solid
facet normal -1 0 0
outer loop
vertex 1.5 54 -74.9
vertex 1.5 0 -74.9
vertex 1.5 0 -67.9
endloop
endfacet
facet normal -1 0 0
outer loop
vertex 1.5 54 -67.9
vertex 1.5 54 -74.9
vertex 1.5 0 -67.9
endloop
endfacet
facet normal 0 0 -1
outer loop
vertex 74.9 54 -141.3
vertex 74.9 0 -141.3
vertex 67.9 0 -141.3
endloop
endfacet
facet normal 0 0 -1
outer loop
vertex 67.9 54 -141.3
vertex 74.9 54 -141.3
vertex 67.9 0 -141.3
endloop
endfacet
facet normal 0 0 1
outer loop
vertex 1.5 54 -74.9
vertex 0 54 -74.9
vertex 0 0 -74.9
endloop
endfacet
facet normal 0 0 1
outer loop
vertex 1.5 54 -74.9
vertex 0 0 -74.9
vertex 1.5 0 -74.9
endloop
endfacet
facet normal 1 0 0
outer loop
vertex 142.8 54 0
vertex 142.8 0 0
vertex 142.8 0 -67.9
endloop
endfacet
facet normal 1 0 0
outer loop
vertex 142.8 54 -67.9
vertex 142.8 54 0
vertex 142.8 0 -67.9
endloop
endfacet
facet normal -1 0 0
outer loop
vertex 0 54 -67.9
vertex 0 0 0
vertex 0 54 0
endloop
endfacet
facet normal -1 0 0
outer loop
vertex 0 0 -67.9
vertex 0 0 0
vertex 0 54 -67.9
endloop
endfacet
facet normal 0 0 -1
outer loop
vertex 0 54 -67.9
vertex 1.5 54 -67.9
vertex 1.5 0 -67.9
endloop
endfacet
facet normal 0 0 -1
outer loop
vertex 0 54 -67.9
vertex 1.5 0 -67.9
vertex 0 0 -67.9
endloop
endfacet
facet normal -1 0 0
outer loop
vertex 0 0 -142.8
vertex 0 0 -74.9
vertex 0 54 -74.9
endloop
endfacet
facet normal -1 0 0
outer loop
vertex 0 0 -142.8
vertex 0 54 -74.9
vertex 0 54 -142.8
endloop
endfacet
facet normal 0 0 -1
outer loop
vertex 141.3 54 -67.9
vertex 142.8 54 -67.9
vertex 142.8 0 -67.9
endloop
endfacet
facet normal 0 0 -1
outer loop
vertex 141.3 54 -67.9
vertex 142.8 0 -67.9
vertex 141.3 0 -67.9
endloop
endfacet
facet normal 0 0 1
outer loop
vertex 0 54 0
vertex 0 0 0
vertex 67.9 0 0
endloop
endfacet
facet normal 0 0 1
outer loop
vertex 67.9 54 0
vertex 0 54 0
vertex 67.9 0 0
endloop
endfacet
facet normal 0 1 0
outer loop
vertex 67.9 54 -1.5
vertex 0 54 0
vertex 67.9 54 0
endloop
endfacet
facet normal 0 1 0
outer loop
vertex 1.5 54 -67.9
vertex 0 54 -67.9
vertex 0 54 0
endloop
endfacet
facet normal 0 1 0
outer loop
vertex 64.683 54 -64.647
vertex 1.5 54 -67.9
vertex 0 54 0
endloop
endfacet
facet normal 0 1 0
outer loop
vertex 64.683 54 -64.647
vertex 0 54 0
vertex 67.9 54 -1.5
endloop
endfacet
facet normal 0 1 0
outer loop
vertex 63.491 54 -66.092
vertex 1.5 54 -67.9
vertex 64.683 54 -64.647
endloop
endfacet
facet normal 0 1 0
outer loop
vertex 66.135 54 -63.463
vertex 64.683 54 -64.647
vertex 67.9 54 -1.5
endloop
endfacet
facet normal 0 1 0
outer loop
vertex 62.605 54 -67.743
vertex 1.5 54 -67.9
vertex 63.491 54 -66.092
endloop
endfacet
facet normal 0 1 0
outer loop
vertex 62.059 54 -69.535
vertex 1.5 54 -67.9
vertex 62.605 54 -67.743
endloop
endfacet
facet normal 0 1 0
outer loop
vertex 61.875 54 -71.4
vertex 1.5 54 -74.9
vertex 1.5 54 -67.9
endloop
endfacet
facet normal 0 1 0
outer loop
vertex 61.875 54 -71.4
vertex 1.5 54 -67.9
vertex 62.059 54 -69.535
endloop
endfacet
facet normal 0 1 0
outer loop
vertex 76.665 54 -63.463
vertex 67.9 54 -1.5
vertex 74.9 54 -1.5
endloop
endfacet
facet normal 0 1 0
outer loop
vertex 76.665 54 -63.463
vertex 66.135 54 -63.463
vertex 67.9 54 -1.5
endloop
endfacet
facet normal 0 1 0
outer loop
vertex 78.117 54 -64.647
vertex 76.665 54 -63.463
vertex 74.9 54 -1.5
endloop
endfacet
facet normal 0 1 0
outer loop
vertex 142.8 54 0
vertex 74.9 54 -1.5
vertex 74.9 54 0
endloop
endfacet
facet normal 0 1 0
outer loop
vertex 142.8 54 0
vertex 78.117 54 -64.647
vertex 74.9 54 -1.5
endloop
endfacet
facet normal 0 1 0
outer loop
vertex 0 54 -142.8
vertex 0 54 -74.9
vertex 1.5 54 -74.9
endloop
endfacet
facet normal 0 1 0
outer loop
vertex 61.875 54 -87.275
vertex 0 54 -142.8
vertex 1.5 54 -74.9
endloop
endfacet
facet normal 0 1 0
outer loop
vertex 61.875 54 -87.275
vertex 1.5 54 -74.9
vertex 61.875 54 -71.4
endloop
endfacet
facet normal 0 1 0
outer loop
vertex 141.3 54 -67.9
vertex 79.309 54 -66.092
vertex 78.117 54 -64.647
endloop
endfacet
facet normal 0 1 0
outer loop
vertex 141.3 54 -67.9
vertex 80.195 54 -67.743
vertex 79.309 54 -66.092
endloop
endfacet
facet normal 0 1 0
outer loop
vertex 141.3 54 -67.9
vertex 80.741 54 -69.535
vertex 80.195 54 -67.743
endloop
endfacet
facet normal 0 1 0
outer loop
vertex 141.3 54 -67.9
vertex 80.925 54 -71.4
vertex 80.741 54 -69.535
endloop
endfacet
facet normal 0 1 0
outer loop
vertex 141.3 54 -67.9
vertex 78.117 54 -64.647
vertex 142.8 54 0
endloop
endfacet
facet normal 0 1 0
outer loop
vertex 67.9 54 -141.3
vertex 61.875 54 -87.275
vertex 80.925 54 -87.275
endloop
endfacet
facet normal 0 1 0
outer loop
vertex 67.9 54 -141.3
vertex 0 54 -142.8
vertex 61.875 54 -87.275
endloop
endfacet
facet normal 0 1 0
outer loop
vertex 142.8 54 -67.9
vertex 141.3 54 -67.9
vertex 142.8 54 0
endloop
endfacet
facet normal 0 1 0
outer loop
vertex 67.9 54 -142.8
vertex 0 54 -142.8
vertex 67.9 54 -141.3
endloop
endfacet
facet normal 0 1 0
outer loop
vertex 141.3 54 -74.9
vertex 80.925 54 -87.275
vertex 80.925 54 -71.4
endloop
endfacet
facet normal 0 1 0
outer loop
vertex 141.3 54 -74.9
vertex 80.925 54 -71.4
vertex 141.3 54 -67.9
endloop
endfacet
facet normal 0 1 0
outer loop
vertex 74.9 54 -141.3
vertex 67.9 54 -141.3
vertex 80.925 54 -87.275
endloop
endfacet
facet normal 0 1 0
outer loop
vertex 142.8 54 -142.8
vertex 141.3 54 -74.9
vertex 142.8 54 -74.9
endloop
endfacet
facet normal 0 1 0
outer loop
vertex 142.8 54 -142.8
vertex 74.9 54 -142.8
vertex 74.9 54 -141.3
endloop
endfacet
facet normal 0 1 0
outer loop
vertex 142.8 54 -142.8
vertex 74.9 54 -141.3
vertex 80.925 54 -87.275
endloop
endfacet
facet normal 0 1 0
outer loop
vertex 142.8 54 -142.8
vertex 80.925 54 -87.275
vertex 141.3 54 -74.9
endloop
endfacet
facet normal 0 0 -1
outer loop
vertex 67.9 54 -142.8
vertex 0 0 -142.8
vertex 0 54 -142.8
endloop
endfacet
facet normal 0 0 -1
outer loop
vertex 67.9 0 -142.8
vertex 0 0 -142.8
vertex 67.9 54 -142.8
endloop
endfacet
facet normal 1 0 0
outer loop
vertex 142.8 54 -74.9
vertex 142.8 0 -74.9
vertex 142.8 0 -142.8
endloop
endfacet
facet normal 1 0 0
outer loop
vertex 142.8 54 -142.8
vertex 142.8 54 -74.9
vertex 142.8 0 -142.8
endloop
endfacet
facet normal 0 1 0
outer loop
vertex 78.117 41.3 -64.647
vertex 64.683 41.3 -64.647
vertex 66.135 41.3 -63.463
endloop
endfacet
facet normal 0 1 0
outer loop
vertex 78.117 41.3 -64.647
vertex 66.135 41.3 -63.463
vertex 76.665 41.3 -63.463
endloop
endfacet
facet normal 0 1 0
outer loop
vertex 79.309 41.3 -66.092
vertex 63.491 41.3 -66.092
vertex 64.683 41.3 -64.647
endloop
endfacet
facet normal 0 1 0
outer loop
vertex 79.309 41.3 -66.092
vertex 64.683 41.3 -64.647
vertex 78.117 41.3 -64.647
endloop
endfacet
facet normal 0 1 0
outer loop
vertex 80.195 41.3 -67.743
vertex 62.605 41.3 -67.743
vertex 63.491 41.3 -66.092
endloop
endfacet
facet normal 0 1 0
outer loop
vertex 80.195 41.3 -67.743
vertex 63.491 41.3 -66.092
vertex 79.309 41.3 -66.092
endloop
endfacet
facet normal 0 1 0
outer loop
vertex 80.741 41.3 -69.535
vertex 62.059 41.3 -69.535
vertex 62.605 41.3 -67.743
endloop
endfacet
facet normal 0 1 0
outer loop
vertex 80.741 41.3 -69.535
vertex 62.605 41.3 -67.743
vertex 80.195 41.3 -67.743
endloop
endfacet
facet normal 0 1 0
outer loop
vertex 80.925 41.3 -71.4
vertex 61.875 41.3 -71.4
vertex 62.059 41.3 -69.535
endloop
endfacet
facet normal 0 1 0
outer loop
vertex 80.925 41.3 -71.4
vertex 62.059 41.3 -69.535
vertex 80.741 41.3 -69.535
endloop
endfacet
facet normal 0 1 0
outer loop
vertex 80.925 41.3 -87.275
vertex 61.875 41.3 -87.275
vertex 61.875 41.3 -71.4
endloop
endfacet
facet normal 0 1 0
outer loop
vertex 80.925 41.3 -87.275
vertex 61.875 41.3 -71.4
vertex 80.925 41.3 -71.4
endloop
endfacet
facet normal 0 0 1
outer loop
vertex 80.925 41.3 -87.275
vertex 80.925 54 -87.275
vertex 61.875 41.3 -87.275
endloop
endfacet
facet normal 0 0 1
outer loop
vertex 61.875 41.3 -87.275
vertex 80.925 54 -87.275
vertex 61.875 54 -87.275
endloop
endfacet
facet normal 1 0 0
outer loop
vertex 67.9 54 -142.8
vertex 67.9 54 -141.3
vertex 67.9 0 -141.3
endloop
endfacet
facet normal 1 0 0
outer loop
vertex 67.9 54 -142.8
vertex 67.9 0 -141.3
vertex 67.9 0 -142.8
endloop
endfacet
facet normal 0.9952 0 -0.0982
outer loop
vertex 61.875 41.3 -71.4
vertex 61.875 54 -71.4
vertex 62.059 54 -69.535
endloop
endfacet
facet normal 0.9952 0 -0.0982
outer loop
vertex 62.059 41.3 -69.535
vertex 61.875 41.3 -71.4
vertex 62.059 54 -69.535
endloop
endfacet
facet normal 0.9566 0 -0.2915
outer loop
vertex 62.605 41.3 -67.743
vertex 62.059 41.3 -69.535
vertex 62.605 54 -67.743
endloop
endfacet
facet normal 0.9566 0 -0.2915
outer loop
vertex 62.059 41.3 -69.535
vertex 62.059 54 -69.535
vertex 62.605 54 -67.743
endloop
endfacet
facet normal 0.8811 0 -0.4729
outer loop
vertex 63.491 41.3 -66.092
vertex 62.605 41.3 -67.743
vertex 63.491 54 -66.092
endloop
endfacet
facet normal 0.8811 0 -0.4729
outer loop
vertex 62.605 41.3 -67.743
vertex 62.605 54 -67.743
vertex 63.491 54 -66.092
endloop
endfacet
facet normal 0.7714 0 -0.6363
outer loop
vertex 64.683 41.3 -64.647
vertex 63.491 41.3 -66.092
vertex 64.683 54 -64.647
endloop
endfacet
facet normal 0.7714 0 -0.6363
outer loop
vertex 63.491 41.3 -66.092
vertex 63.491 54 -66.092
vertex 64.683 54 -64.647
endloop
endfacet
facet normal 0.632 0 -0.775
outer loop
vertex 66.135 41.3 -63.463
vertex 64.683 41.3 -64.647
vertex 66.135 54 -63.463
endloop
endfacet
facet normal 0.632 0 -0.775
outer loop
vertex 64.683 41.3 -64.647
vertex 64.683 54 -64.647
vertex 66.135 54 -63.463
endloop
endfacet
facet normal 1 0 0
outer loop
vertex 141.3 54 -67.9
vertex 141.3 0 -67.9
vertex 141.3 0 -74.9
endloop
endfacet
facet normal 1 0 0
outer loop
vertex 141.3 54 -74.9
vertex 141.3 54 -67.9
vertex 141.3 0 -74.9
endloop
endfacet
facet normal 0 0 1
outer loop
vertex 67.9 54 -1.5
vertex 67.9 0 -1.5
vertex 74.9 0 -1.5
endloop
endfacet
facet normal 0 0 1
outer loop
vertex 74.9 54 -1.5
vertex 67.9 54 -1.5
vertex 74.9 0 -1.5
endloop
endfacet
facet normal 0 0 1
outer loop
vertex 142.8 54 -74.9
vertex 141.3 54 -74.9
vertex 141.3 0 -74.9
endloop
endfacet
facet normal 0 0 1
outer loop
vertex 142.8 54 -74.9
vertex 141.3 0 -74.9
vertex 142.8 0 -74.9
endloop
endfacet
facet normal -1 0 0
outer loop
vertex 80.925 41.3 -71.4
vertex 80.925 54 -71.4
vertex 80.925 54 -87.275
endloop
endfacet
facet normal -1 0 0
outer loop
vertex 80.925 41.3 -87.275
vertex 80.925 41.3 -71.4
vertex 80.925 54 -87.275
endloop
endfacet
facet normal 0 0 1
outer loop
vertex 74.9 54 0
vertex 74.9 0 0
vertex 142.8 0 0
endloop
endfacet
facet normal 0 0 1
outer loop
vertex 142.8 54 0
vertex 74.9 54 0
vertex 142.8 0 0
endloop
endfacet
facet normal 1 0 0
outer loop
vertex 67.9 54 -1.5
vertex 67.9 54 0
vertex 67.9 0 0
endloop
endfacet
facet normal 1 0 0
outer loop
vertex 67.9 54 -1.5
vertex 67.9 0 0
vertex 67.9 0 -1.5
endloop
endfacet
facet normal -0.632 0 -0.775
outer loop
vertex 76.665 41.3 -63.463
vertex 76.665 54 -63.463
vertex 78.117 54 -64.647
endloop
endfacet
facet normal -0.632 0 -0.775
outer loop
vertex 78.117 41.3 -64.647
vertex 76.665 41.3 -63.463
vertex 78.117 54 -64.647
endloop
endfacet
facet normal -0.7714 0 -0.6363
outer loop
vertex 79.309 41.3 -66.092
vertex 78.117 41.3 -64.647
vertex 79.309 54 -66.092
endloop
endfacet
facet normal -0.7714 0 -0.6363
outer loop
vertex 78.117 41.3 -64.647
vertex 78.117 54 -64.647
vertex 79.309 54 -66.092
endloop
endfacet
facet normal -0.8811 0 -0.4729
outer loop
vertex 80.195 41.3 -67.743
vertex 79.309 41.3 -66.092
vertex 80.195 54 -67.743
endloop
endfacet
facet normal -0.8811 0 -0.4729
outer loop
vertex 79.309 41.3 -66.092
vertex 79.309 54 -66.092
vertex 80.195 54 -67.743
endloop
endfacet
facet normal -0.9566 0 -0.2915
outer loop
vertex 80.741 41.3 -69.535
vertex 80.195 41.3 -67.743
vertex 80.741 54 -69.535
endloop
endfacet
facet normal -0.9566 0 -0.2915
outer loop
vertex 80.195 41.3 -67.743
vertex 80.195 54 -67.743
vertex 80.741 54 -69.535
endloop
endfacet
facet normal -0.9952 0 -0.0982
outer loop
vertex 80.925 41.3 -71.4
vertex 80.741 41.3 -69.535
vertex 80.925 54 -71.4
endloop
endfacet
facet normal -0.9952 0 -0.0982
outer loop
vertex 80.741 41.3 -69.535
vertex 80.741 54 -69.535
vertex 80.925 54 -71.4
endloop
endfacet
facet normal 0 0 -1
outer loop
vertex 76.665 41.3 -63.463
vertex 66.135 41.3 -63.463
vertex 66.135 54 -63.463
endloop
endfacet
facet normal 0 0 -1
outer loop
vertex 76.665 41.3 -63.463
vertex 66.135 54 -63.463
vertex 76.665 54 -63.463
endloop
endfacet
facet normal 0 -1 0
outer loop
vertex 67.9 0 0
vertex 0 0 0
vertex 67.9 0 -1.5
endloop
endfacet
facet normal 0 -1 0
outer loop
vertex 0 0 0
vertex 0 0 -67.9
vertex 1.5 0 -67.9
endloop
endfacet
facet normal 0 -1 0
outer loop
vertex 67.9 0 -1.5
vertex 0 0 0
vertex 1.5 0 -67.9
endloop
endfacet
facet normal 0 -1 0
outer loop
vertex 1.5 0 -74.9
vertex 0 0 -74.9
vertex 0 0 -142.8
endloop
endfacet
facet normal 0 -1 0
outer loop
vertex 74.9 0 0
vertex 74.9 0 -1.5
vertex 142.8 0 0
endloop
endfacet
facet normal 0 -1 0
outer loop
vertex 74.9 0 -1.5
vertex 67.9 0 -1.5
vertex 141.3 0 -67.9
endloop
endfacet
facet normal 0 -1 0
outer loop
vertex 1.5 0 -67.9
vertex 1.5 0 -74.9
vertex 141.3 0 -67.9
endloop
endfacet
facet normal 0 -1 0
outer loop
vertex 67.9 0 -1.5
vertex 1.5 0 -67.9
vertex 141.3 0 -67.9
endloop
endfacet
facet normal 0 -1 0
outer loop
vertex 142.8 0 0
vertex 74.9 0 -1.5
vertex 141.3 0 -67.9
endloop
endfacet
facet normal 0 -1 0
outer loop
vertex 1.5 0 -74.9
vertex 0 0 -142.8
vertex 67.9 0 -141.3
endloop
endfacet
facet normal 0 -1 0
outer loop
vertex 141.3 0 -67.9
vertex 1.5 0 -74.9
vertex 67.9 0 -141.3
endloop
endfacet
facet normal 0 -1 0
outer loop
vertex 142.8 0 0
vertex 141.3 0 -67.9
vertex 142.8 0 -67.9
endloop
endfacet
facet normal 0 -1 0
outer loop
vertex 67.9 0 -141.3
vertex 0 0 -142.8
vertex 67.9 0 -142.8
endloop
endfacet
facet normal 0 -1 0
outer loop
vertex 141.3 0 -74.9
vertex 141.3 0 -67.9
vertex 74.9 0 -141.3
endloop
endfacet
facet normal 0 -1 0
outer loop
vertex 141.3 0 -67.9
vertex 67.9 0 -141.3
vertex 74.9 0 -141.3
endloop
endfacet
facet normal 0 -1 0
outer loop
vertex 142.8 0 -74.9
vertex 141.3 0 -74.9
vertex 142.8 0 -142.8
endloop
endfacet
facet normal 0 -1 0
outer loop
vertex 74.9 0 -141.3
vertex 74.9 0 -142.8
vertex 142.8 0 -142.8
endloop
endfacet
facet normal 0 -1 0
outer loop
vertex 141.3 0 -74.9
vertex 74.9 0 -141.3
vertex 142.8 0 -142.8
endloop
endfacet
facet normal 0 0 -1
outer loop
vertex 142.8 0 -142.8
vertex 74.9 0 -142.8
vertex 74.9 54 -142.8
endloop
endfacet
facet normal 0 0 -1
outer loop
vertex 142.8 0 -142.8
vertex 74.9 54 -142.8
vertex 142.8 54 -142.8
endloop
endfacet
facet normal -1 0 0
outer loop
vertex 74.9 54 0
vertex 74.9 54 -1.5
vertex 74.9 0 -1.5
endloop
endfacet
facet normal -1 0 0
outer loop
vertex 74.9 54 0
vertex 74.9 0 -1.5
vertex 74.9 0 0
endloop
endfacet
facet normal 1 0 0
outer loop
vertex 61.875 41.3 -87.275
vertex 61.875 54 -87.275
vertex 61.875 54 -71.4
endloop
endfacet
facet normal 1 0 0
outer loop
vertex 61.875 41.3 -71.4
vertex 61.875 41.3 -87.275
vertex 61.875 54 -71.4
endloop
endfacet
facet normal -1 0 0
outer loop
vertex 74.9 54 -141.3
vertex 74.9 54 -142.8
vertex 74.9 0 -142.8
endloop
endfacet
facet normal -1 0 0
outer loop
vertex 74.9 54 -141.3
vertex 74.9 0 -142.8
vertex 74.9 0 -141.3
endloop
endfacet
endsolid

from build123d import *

# Parameters (mm, degrees)
SKETCH1_W           = 142.8
SKETCH1_H           = 142.8
BOSS_EXTRUDE1_DEPTH = 54
SKETCH2_W           = 10.53028371
SKETCH2_H           = 7.9375
CUT_EXTRUDE1_DEPTH  = 12.7
CUT_EXTRUDE5_DEPTH  = 210.044684218
CIRPATTERN3_COUNT   = 4


with BuildPart() as part:
    # Sketch1 → Boss-Extrude1 (new body)
    with BuildSketch(Plane(origin=(0, 0, 0), x_dir=(1, 0, 0), z_dir=(0, 1, 0))):
        with Locations((71.4, 71.4)):
            Rectangle(SKETCH1_W, SKETCH1_H)
    extrude(amount=BOSS_EXTRUDE1_DEPTH)

    # Sketch2 → Cut-Extrude1 (cut)
    with BuildSketch(Plane(origin=(0, 54, 0), x_dir=(1, 0, 0), z_dir=(0, 1, 0))):
        with BuildLine():
            ThreePointArc((76.665141855, 79.3375), (79.792737967, 75.904173), (80.925, 71.4))
            Line((80.925, 71.4), (80.925, 87.275))
            Line((80.925, 87.275), (61.875, 87.275))
            Line((61.875, 87.275), (61.875, 71.4))
            ThreePointArc((61.875, 71.4), (63.007262033, 75.904173), (66.134858145, 79.3375))
            ThreePointArc((66.134858145, 79.3375), (71.4, 80.925), (76.665141855, 79.3375))
        make_face()
        with BuildLine():
            ThreePointArc((76.665141855, 63.4625), (79.792737967, 66.895827), (80.925, 71.4))
            Line((80.925, 71.4), (76.665141855, 71.4))
            Line((76.665141855, 71.4), (76.665141855, 63.4625))
        make_face()
        with BuildLine():
            Line((76.665141855, 71.4), (80.925, 71.4))
            ThreePointArc((80.925, 71.4), (79.792737967, 75.904173), (76.665141855, 79.3375))
            Line((76.665141855, 79.3375), (76.665141855, 71.4))
        make_face()
        with BuildLine():
            Line((66.134858145, 63.4625), (66.134858145, 71.4))
            Line((66.134858145, 71.4), (61.875, 71.4))
            ThreePointArc((61.875, 71.4), (63.007262033, 66.895827), (66.134858145, 63.4625))
        make_face()
        with BuildLine():
            Line((61.875, 71.4), (66.134858145, 71.4))
            Line((66.134858145, 71.4), (66.134858145, 79.3375))
            ThreePointArc((66.134858145, 79.3375), (63.007262033, 75.904173), (61.875, 71.4))
        make_face()
        with Locations((71.4, 75.36875)):
            Rectangle(SKETCH2_W, SKETCH2_H)
        with BuildLine():
            Line((66.134858145, 79.3375), (76.665141855, 79.3375))
            ThreePointArc((76.665141855, 79.3375), (71.4, 80.925), (66.134858145, 79.3375))
        make_face()
        with BuildLine():
            ThreePointArc((76.665141855, 63.4625), (79.792737967, 66.895827), (80.925, 71.4))
            Line((80.925, 71.4), (76.665141855, 71.4))
            Line((76.665141855, 71.4), (76.665141855, 63.4625))
        make_face()
        with BuildLine():
            Line((76.665141855, 71.4), (80.925, 71.4))
            ThreePointArc((80.925, 71.4), (79.792737967, 75.904173), (76.665141855, 79.3375))
            Line((76.665141855, 79.3375), (76.665141855, 71.4))
        make_face()
        with BuildLine():
            Line((66.134858145, 63.4625), (66.134858145, 71.4))
            Line((66.134858145, 71.4), (61.875, 71.4))
            ThreePointArc((61.875, 71.4), (63.007262033, 66.895827), (66.134858145, 63.4625))
        make_face()
        with BuildLine():
            Line((61.875, 71.4), (66.134858145, 71.4))
            Line((66.134858145, 71.4), (66.134858145, 79.3375))
            ThreePointArc((66.134858145, 79.3375), (63.007262033, 75.904173), (61.875, 71.4))
        make_face()
        with Locations((71.4, 67.43125)):
            Rectangle(SKETCH2_W, SKETCH2_H)
    extrude(amount=-CUT_EXTRUDE1_DEPTH, mode=Mode.SUBTRACT)

    # Sketch7 → Cut-Extrude5 (cut, through all)
    with BuildSketch(Plane.XZ):
        Polygon((71.4, -142.8), (74.9, -142.8), (74.9, -141.3), (71.4, -141.3), (67.9, -141.3), (67.9, -142.8), align=None)
    cut_extrude5 = extrude(amount=-CUT_EXTRUDE5_DEPTH, mode=Mode.SUBTRACT)

    # CirPattern3: Cut-Extrude5 ×4 about axis
    cirpattern3_axis = Axis((71.4, 0, -71.4), (0, -1, 0))
    for i in range(1, CIRPATTERN3_COUNT):
        add(cut_extrude5.rotate(cirpattern3_axis, i * 360 / CIRPATTERN3_COUNT), mode=Mode.SUBTRACT)


solid = part.part
